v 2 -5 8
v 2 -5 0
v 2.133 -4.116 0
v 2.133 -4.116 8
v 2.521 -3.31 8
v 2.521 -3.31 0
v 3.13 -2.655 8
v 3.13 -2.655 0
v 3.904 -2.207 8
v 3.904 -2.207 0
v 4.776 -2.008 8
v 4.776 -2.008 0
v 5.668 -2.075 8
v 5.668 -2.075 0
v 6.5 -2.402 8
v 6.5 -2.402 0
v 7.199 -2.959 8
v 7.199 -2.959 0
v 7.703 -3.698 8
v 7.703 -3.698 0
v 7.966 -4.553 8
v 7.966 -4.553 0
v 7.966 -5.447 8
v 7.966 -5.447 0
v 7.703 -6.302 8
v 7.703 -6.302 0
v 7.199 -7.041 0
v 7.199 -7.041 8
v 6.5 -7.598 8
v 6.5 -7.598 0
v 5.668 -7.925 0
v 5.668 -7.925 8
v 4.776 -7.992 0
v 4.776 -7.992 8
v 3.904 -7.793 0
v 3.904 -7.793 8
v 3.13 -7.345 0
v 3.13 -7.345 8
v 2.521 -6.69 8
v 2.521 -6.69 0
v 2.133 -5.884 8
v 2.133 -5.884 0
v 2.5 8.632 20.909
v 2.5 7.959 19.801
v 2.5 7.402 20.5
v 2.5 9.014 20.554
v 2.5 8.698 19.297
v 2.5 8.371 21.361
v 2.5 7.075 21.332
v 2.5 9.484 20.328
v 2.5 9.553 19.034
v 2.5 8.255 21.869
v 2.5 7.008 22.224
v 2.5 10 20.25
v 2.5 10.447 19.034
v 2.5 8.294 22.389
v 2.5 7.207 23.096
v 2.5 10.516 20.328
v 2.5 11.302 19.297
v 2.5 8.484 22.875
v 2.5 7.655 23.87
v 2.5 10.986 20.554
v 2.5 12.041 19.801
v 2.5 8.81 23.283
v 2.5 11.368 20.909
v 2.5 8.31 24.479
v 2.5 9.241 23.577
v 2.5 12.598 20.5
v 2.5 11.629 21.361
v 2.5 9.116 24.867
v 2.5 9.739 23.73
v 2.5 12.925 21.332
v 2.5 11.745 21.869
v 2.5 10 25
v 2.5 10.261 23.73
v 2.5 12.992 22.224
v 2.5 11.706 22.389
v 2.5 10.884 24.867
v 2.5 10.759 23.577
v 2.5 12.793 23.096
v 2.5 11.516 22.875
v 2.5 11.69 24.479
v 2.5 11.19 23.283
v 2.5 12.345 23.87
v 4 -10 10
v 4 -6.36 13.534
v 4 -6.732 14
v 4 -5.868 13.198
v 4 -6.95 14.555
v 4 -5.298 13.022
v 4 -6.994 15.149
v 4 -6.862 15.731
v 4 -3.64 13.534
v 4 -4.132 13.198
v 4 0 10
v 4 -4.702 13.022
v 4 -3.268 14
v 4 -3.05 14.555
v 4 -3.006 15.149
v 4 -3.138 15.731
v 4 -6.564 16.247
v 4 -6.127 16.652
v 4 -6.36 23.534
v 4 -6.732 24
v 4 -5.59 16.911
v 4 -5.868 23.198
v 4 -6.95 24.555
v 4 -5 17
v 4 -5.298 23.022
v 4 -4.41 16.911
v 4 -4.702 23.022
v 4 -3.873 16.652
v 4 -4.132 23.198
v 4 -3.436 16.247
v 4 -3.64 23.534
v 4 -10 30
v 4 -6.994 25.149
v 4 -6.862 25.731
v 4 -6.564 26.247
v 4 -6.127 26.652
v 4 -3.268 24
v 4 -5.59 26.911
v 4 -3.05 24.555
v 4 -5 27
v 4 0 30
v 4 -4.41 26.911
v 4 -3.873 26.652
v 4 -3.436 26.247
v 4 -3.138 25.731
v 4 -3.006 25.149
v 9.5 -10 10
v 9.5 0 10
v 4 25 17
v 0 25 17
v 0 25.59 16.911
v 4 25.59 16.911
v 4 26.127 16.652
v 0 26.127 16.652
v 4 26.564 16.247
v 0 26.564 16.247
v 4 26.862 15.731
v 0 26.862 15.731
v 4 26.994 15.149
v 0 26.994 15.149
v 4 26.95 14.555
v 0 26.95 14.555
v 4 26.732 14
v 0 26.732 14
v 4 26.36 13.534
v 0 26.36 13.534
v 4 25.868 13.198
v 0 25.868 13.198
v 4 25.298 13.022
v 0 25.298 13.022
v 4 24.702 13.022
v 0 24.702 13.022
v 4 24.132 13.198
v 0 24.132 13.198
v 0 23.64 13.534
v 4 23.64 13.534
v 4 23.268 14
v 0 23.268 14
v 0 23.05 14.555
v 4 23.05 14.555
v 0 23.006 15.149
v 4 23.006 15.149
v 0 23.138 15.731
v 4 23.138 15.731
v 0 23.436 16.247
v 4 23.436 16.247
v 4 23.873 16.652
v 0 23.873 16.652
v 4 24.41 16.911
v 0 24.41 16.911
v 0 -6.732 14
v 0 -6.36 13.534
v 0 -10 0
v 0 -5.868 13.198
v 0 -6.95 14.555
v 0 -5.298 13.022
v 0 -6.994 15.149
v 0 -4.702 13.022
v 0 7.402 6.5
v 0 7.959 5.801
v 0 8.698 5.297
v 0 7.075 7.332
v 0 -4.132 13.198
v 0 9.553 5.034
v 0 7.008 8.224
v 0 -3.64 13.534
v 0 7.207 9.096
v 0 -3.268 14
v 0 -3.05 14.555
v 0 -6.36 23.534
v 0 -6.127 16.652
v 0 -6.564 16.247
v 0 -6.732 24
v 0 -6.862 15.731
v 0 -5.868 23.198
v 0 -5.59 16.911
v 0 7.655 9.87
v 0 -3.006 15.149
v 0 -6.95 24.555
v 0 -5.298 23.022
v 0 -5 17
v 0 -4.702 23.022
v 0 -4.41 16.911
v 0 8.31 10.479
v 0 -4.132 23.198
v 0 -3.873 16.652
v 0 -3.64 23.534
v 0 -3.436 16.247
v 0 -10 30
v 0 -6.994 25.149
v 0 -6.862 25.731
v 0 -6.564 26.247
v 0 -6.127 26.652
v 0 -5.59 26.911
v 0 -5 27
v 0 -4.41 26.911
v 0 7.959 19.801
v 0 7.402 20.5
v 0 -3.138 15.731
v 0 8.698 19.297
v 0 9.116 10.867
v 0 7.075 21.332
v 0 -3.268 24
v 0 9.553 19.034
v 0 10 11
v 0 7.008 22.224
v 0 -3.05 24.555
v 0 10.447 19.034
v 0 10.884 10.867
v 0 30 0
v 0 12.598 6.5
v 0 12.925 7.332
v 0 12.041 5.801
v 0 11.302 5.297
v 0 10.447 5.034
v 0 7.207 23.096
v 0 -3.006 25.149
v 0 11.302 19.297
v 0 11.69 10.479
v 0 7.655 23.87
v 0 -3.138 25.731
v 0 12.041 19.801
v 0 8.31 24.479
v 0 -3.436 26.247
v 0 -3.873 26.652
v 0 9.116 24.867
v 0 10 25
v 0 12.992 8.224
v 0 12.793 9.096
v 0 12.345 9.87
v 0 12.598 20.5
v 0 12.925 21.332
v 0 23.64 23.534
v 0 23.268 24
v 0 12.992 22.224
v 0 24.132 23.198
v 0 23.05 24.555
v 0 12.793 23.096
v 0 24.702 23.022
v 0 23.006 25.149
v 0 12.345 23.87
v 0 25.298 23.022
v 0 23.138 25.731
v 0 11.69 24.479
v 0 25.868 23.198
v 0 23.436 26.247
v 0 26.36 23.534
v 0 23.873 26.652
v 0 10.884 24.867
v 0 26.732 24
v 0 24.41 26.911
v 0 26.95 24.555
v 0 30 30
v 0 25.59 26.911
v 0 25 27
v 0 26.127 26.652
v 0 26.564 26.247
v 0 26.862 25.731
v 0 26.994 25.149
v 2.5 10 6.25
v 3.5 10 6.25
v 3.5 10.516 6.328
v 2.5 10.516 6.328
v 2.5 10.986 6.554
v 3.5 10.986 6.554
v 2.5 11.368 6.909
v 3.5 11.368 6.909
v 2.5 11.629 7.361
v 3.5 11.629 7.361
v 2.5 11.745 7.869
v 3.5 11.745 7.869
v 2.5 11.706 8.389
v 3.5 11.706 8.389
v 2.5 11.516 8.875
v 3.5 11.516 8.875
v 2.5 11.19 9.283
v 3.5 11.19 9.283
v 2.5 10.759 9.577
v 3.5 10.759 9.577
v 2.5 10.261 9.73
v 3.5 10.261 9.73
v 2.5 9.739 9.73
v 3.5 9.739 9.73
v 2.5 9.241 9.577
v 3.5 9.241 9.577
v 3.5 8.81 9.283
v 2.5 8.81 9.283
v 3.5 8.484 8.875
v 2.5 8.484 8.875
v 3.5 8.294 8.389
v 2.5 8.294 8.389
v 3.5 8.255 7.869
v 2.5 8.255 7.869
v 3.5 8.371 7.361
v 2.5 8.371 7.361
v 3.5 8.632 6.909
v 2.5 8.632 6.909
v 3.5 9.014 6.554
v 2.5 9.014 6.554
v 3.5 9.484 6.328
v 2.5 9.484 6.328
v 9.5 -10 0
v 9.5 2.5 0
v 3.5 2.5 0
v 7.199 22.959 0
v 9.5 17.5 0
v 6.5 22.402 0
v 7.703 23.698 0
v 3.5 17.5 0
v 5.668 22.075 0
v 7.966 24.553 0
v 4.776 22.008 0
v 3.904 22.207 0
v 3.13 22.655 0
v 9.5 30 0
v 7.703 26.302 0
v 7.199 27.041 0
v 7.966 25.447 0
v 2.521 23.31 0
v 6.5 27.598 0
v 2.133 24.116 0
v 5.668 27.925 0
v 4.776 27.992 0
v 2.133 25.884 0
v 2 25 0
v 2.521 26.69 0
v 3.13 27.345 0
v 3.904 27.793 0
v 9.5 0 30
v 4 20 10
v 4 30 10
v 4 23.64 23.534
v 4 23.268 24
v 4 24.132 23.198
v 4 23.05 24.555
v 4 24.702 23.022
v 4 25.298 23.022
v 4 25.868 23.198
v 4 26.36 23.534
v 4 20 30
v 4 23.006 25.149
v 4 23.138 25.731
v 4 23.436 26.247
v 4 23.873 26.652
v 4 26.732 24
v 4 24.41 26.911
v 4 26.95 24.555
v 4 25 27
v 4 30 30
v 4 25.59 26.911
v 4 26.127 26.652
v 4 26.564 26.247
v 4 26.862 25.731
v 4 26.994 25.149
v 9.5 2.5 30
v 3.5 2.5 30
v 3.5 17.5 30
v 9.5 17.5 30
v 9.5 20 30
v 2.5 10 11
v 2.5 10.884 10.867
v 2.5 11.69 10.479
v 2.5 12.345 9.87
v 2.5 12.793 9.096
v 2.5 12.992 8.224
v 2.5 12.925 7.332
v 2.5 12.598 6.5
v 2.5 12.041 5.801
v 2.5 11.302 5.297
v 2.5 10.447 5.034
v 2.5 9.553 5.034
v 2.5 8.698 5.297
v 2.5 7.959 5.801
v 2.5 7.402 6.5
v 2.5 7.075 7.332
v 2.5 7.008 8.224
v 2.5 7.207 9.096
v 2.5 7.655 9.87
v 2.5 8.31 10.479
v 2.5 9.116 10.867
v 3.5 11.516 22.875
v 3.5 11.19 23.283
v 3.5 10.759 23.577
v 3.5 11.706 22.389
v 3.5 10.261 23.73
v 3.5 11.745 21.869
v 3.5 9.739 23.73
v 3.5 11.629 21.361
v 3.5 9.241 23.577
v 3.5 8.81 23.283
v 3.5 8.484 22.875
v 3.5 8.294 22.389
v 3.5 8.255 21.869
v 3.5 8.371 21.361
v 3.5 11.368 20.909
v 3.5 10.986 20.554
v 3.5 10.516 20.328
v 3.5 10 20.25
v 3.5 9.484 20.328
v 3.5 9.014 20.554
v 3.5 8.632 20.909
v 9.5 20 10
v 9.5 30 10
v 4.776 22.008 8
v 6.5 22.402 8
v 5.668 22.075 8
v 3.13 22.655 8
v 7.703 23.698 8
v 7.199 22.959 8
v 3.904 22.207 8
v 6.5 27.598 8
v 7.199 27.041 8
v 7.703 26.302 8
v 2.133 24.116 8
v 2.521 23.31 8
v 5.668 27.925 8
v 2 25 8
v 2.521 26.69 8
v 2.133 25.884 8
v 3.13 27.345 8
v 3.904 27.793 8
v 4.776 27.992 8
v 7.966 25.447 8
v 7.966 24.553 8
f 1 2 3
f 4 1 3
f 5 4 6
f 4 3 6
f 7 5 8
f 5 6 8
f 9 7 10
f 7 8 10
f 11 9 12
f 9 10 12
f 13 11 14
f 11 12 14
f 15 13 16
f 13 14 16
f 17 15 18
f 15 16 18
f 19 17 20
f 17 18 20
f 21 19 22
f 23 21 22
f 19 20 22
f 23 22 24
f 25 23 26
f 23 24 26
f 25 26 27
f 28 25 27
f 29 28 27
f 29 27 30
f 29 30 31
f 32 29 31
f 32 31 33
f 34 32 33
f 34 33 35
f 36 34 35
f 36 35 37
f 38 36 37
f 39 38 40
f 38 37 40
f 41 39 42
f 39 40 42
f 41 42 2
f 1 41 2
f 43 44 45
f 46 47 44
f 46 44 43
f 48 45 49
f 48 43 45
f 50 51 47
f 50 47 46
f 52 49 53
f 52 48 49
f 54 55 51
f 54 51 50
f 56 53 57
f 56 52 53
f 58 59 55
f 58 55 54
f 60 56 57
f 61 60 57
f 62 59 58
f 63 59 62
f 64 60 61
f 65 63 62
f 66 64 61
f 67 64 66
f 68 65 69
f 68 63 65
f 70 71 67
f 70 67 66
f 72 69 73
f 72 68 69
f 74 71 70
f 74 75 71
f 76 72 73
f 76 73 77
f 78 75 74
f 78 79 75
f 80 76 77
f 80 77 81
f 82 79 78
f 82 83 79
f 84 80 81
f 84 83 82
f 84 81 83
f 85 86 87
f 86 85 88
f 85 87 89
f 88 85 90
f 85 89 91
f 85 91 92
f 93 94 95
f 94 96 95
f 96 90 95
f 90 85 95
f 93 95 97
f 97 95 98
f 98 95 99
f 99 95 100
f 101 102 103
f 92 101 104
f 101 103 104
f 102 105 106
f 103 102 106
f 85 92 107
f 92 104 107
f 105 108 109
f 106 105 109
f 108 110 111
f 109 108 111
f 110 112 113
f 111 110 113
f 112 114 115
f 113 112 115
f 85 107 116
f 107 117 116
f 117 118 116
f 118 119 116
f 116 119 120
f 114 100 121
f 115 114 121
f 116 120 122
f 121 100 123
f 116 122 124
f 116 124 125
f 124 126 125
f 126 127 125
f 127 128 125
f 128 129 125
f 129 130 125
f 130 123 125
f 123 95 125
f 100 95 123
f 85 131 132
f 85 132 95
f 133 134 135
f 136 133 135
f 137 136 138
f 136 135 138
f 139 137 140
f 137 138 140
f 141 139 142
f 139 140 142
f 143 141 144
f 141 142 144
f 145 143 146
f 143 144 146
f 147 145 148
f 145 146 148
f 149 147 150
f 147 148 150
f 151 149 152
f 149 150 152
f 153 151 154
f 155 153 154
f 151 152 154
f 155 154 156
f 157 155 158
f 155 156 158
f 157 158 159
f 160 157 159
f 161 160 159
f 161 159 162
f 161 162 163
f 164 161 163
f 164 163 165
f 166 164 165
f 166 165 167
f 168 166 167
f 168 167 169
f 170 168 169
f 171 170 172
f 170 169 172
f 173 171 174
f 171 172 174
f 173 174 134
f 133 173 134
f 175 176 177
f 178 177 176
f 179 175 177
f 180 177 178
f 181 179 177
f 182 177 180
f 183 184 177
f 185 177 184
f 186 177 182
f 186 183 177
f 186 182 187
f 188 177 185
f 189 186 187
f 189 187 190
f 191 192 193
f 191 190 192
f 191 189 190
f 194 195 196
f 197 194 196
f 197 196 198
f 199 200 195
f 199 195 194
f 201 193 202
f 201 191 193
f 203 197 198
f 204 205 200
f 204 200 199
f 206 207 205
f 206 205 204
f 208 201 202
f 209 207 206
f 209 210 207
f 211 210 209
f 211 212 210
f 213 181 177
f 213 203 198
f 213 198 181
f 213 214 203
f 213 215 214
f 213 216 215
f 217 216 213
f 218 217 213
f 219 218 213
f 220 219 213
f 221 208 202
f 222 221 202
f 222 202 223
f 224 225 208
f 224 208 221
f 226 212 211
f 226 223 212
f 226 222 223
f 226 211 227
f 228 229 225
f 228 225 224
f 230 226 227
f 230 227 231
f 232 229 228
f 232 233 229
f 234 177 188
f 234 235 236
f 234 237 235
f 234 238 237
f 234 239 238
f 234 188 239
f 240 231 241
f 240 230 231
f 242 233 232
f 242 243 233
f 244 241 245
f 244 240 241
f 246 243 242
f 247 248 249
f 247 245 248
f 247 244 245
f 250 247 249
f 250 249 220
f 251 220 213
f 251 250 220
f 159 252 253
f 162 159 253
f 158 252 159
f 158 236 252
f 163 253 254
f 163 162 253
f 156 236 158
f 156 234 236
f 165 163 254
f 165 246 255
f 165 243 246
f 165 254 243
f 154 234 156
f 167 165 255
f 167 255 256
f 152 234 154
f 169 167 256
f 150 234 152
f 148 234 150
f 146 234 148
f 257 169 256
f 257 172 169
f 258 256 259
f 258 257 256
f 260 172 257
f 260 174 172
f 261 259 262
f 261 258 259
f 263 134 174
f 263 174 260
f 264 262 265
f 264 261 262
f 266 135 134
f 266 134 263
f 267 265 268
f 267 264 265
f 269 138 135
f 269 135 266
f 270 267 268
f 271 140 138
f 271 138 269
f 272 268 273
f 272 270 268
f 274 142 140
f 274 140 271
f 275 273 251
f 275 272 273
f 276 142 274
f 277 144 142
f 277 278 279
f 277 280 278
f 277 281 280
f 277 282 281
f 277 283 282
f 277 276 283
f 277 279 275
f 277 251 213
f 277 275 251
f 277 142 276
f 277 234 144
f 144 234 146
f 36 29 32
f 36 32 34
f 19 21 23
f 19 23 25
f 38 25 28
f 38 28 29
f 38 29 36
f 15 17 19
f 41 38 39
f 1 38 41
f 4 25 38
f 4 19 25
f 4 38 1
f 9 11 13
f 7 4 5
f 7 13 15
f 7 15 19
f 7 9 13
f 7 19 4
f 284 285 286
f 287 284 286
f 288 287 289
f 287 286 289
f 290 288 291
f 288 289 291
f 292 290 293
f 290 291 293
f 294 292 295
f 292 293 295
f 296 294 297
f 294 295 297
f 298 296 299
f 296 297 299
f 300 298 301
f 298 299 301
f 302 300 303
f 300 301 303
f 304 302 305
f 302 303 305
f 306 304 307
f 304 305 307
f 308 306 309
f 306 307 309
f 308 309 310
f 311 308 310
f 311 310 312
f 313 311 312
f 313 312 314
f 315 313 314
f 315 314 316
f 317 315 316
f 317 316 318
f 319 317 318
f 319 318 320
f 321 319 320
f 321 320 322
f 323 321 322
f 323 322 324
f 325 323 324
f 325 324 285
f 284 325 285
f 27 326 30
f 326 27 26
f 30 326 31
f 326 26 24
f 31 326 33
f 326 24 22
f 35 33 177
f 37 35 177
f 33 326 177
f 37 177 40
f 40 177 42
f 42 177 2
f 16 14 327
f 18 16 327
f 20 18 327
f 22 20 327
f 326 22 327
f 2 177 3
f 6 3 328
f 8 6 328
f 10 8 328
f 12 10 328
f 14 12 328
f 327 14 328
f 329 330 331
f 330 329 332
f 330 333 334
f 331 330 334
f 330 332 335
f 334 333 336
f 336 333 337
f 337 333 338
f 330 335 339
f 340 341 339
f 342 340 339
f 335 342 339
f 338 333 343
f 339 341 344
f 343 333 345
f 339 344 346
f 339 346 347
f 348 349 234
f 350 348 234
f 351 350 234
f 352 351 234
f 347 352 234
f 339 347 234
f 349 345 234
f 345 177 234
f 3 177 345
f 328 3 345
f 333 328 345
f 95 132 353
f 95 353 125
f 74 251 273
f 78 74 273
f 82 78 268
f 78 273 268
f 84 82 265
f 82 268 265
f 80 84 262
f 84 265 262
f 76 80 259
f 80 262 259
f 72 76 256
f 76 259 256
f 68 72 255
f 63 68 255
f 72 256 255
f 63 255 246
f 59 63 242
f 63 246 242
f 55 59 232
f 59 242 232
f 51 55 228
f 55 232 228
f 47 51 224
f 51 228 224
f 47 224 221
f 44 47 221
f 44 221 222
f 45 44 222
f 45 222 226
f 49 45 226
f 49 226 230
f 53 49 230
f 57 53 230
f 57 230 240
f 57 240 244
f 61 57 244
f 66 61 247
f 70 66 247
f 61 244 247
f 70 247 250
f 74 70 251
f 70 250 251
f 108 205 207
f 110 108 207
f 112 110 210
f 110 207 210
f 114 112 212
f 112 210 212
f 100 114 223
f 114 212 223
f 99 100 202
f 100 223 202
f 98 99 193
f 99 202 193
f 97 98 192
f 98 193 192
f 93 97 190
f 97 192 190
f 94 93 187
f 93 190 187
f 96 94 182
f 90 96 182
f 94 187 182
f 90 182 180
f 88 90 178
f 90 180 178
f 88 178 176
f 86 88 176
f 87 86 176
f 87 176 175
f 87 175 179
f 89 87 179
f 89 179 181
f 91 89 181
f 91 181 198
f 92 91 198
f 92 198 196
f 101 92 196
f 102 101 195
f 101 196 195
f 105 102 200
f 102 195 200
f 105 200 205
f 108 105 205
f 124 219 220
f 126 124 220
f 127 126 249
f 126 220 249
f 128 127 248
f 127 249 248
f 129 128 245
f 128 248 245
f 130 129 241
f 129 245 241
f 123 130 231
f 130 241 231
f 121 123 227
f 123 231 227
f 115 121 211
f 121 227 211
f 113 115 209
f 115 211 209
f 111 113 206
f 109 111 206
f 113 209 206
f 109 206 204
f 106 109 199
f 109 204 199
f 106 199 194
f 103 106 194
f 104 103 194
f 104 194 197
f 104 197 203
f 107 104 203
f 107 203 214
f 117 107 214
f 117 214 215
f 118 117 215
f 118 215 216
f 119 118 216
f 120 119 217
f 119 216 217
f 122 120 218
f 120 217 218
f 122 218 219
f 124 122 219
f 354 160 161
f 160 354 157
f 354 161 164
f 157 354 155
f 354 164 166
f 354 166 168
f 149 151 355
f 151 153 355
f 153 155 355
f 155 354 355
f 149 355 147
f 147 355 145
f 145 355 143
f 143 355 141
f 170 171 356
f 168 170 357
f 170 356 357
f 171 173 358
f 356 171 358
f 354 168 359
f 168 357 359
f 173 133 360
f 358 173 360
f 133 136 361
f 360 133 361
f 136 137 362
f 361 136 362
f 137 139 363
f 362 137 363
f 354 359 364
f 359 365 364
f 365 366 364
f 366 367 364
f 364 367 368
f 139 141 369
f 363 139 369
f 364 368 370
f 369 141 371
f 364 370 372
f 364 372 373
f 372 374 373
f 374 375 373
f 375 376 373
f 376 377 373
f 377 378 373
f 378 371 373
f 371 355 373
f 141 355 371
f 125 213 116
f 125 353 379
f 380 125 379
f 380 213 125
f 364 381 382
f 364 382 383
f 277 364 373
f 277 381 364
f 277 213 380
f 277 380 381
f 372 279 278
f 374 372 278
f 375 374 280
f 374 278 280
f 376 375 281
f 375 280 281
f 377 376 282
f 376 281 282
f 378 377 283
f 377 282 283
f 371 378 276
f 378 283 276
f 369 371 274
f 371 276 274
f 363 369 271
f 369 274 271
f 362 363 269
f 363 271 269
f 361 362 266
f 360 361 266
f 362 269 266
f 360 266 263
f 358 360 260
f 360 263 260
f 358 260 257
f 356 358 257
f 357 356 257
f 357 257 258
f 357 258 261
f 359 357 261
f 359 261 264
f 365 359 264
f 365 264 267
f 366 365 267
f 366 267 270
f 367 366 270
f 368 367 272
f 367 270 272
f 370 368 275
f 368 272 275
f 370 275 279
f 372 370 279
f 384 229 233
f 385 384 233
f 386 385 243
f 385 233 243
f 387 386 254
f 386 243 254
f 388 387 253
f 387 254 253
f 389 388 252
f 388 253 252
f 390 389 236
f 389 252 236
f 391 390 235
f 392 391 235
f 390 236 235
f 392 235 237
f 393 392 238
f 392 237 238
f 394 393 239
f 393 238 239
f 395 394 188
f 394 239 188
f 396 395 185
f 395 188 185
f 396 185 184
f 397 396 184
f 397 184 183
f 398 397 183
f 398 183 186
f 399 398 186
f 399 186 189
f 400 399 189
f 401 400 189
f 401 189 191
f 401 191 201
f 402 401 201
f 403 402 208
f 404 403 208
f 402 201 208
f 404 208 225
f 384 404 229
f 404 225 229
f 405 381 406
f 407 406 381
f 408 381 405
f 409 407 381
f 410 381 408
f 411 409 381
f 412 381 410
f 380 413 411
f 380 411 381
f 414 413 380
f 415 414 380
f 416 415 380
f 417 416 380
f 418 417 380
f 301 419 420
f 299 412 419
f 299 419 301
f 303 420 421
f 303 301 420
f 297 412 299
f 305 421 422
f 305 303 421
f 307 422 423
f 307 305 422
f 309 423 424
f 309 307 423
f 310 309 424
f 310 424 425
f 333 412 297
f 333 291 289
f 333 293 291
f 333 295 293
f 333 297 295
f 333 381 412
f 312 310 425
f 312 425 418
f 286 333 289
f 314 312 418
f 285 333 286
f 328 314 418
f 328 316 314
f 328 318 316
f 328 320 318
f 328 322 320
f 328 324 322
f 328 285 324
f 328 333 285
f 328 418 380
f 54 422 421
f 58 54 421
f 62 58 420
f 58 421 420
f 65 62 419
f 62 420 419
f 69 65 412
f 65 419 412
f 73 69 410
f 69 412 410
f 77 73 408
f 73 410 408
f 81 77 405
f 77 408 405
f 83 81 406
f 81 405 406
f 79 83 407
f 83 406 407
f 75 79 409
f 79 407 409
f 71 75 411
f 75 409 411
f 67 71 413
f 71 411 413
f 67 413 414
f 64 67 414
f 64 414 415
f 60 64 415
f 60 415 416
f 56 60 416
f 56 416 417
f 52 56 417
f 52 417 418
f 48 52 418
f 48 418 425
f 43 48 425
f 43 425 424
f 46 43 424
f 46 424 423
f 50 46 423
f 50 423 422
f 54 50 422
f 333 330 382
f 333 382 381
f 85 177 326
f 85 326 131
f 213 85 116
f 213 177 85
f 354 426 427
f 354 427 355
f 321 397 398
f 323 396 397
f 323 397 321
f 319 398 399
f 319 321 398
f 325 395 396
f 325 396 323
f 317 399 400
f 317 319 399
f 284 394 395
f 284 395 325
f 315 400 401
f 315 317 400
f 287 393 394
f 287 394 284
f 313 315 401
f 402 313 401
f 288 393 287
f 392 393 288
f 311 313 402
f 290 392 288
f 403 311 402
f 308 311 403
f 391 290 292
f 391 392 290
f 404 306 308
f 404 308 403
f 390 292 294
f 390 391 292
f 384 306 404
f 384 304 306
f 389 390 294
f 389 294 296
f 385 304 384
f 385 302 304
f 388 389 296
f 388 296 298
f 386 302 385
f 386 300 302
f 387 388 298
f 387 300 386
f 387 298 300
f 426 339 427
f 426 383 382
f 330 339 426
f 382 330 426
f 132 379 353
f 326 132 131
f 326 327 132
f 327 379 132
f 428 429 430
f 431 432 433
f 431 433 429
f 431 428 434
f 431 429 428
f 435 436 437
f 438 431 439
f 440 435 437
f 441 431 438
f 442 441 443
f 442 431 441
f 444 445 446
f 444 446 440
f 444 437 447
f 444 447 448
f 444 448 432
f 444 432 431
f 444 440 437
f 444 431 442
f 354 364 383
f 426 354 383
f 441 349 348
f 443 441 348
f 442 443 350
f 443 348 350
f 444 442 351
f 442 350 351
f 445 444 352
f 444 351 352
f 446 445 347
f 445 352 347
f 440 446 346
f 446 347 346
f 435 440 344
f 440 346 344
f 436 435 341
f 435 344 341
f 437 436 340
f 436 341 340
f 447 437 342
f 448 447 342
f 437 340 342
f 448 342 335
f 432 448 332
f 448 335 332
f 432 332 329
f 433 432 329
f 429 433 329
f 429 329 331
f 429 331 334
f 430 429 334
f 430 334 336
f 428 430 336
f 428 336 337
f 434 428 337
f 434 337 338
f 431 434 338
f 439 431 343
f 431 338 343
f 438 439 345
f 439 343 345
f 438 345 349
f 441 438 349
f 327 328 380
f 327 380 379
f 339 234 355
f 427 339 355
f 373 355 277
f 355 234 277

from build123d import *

# Parameters (mm, degrees)
BOSS_EXTRU_1_DEPTH      = 30
ESQUISSE2_R             = 1.75
ENL_V_MAT_EXTRU_1_DEPTH = 37.551333765
ESQUISSE3_R             = 3
ENL_V_MAT_EXTRU_2_DEPTH = 2.5
ESQUISSE4_W             = 30
ESQUISSE4_H             = 10
ESQUISSE4_R             = 2
BOSS_EXTRU_2_DEPTH      = 4
ESQUISSE5_W             = 9.5
ESQUISSE5_H             = 12.5
ESQUISSE5_H_2           = 10
BOSS_EXTRU_3_DEPTH      = 10
ESQUISSE6_R             = 3
ENL_V_MAT_EXTRU_3_DEPTH = 8


with BuildPart() as part:
    # Esquisse1 → Boss.-Extru.1 (new body)
    with BuildSketch(Plane.XY):
        Polygon((9.5, 20), (9.5, 17.5), (3.5, 17.5), (3.5, 2.5), (9.5, 2.5), (9.5, 0), (0, 0), (0, 20), align=None)
    extrude(amount=BOSS_EXTRU_1_DEPTH)

    # Esquisse2 → Enlèv. mat.-Extru.1 (cut, through all)
    with BuildSketch(Plane(origin=(3.5, 0, 0), x_dir=(0, 0, -1), z_dir=(1, 0, 0))):
        with Locations((-22, 10)):
            Circle(ESQUISSE2_R)
        with Locations((-8, 10)):
            Circle(ESQUISSE2_R)
    extrude(amount=-ENL_V_MAT_EXTRU_1_DEPTH, mode=Mode.SUBTRACT)

    # Esquisse3 → Enlèv. mat.-Extru.2 (cut)
    with BuildSketch(Plane.ZY):
        with Locations((8, 10)):
            Circle(ESQUISSE3_R)
        with Locations((22, 10)):
            Circle(ESQUISSE3_R)
    extrude(amount=-ENL_V_MAT_EXTRU_2_DEPTH, mode=Mode.SUBTRACT)

    # Esquisse4 → Boss.-Extru.2 (add)
    # profile 1 of 2: a face of its own
    with BuildSketch(Plane.ZY):
        with Locations((15, -5)):
            Rectangle(ESQUISSE4_W, ESQUISSE4_H)
        with Locations((15, -5)):
            Circle(ESQUISSE4_R, mode=Mode.SUBTRACT)
        with Locations((5, -5)):
            Circle(ESQUISSE4_R, mode=Mode.SUBTRACT)
        with Locations((25, -5)):
            Circle(ESQUISSE4_R, mode=Mode.SUBTRACT)
    # profile 2 of 2: a face of its own
    with BuildSketch(Plane.ZY):
        with Locations((15, 25)):
            Rectangle(ESQUISSE4_W, ESQUISSE4_H)
        with Locations((15, 25)):
            Circle(ESQUISSE4_R, mode=Mode.SUBTRACT)
        with Locations((5, 25)):
            Circle(ESQUISSE4_R, mode=Mode.SUBTRACT)
        with Locations((25, 25)):
            Circle(ESQUISSE4_R, mode=Mode.SUBTRACT)
    extrude(amount=-BOSS_EXTRU_2_DEPTH)

    # Esquisse5 → Boss.-Extru.3 (add)
    with BuildSketch(Plane(origin=(0, 0, 0), x_dir=(-1, 0, 0), z_dir=(0, 0, -1))):
        with Locations((-4.75, 23.75)):
            Rectangle(ESQUISSE5_W, ESQUISSE5_H)
        with Locations((-4.75, -5)):
            Rectangle(ESQUISSE5_W, ESQUISSE5_H_2)
    extrude(amount=-BOSS_EXTRU_3_DEPTH)

    # Esquisse6 → Enlèv. mat.-Extru.3 (cut)
    with BuildSketch(Plane(origin=(0, 0, 0), x_dir=(-1, 0, 0), z_dir=(0, 0, -1))):
        with Locations((-5, 25)):
            Circle(ESQUISSE6_R)
        with Locations((-5, -5)):
            Circle(ESQUISSE6_R)
    extrude(amount=-ENL_V_MAT_EXTRU_3_DEPTH, mode=Mode.SUBTRACT)


solid = part.part
